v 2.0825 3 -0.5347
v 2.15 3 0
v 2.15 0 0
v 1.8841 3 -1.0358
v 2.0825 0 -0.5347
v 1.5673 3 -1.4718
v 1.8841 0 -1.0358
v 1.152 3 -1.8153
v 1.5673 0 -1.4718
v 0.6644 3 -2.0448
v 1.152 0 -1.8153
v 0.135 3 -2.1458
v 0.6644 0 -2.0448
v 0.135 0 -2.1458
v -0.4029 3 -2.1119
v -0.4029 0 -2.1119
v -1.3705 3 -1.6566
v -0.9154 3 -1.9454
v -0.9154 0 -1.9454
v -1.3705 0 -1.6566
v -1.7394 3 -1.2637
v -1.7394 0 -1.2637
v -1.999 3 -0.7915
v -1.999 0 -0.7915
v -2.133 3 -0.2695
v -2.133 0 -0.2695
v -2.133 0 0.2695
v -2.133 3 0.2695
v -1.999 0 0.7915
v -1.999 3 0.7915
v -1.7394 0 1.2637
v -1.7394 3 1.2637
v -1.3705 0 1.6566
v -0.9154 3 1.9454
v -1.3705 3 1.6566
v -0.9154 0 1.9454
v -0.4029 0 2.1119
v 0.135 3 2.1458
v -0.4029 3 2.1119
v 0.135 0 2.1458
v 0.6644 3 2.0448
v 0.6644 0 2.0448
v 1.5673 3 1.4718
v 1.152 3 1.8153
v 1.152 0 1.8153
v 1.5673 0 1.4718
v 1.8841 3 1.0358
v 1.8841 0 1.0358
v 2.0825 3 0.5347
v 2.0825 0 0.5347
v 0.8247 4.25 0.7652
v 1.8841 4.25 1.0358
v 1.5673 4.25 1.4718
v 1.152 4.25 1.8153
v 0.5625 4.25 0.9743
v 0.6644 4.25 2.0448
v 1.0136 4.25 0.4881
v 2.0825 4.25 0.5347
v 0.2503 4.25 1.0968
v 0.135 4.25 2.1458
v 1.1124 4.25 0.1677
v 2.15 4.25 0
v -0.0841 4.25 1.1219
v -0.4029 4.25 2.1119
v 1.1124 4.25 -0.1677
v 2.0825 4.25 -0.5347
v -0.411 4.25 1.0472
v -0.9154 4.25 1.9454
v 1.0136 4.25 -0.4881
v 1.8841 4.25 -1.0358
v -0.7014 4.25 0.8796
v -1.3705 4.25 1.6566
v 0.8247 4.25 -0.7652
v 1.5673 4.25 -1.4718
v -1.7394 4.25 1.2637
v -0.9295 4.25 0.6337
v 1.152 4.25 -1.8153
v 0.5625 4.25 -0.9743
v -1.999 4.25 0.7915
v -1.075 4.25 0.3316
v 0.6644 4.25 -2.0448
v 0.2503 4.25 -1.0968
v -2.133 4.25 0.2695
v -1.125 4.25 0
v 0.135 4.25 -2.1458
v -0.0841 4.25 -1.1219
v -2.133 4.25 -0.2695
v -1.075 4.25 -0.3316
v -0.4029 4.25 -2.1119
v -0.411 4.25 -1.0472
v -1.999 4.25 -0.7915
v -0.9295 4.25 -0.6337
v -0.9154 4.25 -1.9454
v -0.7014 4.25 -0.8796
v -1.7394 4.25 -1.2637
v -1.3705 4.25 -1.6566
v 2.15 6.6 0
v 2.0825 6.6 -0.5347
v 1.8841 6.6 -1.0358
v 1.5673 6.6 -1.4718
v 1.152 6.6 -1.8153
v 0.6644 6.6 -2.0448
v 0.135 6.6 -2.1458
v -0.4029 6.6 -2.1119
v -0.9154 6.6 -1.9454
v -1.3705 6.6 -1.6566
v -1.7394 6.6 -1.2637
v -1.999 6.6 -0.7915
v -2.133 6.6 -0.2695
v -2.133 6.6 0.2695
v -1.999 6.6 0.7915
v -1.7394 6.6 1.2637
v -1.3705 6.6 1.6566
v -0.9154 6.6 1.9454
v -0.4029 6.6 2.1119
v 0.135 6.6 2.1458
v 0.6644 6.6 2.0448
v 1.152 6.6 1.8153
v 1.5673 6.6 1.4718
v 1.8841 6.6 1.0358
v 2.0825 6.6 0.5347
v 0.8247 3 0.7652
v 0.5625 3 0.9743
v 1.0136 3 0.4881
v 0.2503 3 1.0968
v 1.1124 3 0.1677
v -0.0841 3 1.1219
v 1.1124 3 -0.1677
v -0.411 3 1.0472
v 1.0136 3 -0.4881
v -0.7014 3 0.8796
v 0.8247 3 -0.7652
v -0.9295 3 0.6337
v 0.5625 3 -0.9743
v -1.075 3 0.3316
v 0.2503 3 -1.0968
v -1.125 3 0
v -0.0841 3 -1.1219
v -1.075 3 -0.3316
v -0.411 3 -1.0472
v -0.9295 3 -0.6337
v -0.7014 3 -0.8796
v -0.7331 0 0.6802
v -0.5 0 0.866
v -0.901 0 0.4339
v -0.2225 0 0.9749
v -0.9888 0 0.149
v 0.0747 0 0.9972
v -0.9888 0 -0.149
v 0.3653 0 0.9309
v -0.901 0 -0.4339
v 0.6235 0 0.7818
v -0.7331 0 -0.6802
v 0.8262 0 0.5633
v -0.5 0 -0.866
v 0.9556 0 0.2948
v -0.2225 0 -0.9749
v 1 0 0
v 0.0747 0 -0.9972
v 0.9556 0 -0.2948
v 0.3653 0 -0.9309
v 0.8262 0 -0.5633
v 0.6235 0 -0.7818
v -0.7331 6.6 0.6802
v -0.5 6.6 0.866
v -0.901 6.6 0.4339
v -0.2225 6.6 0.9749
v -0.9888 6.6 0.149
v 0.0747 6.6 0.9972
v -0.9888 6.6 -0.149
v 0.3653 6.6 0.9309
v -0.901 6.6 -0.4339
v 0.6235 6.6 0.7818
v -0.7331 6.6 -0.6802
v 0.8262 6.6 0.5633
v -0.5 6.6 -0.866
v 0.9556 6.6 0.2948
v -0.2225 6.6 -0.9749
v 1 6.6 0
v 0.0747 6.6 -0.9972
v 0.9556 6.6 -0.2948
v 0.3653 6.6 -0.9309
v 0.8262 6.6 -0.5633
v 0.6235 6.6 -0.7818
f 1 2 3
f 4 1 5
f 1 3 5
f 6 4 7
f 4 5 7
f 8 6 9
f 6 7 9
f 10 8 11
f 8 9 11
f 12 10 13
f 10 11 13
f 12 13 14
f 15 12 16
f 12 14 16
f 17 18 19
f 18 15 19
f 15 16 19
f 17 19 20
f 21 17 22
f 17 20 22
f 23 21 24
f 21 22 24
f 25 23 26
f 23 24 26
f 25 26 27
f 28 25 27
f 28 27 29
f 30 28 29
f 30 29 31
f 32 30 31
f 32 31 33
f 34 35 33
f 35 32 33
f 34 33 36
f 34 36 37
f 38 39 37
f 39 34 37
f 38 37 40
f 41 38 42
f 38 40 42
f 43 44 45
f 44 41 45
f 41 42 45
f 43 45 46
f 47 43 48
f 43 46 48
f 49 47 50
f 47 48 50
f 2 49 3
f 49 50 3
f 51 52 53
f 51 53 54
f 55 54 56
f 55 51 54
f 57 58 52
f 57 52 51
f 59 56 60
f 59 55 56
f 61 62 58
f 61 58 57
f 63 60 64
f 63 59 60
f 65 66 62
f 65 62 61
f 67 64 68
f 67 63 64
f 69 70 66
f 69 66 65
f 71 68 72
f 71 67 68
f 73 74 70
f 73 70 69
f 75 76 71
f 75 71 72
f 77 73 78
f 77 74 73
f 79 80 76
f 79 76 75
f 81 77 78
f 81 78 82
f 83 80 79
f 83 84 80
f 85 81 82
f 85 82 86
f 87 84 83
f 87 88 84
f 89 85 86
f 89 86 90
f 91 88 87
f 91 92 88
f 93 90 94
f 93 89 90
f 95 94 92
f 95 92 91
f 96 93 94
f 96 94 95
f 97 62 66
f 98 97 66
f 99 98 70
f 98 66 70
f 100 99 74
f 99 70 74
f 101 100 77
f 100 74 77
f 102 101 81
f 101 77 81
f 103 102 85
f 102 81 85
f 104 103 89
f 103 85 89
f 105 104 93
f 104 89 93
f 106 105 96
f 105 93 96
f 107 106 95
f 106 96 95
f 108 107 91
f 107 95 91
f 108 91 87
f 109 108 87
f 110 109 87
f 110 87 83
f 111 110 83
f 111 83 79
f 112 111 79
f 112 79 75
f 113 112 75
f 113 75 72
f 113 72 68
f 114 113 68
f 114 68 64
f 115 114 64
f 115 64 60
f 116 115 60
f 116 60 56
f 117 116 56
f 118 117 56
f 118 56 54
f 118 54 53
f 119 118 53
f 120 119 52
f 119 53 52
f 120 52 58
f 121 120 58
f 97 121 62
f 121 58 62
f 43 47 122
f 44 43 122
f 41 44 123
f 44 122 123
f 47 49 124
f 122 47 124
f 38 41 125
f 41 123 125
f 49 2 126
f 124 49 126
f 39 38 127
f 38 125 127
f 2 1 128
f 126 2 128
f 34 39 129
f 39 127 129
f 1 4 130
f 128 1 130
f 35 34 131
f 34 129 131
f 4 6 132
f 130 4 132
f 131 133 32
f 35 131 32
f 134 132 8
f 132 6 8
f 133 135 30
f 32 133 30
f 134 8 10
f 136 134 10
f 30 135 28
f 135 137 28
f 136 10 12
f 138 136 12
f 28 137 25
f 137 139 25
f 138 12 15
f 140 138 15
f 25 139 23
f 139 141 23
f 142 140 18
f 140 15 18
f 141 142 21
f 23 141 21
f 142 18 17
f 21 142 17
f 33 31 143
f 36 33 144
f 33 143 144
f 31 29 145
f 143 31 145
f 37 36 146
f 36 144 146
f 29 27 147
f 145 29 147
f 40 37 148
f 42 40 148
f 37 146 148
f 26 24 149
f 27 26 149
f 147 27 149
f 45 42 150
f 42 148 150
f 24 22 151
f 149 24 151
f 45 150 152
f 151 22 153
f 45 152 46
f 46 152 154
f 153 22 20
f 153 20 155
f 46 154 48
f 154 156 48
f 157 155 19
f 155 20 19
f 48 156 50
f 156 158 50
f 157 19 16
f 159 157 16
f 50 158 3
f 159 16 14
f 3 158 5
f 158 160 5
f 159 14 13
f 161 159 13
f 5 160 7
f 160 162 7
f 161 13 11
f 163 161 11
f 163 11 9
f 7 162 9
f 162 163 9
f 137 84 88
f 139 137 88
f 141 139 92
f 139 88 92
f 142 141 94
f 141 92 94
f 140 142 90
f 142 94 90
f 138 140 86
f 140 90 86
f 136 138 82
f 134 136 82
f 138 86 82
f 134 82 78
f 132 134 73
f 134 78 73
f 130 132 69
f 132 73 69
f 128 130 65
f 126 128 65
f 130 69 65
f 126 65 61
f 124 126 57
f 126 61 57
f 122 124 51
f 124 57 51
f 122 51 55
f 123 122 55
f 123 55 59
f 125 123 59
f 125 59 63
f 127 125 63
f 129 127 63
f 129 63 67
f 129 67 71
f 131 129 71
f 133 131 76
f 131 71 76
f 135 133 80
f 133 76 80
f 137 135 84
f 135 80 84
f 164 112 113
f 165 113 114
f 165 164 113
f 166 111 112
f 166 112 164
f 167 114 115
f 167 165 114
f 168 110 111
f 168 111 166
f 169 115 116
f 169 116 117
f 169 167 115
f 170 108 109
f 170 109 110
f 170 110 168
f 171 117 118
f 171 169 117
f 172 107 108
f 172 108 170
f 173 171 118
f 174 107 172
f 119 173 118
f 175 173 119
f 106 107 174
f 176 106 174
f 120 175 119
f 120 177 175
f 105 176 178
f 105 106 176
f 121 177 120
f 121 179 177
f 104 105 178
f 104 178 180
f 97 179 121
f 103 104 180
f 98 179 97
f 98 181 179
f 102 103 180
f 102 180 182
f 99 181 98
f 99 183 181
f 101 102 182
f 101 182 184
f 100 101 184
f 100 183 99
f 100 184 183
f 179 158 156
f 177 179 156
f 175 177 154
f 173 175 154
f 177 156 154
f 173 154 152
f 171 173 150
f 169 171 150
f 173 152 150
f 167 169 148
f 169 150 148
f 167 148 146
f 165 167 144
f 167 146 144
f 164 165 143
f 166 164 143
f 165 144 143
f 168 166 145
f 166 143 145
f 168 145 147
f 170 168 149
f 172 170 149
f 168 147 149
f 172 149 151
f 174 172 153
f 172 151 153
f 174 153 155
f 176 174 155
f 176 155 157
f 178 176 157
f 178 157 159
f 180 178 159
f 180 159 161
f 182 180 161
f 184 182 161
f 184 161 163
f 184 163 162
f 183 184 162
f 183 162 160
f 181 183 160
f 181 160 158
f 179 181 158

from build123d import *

# Parameters (mm, degrees)
SKETCH1_R           = 2.15
BOSS_EXTRUDE1_DEPTH = 6.6
SKETCH2_R           = 1
CUT_EXTRUDE1_DEPTH  = 7.6
SKETCH3_R           = 2.15
SKETCH3_R_2         = 1.125
CUT_EXTRUDE2_DEPTH  = 1.25


with BuildPart() as part:
    # Sketch1 → Boss-Extrude1 (new body)
    with BuildSketch(Plane(origin=(0, 0, 0), x_dir=(1, 0, 0), z_dir=(0, 1, 0))):
        Circle(SKETCH1_R)
    extrude(amount=BOSS_EXTRUDE1_DEPTH)

    # Sketch2 → Cut-Extrude1 (cut, through all)
    with BuildSketch(Plane.XZ):
        Circle(SKETCH2_R)
    extrude(amount=-CUT_EXTRUDE1_DEPTH, mode=Mode.SUBTRACT)

    # Sketch3 → Cut-Extrude2 (cut)
    with BuildSketch(Plane(origin=(0, 4.25, 0), x_dir=(-1, 0, 0), z_dir=(0, -1, 0))):
        Circle(SKETCH3_R)
        Circle(SKETCH3_R_2, mode=Mode.SUBTRACT)
    extrude(amount=CUT_EXTRUDE2_DEPTH, mode=Mode.SUBTRACT)


solid = part.part
